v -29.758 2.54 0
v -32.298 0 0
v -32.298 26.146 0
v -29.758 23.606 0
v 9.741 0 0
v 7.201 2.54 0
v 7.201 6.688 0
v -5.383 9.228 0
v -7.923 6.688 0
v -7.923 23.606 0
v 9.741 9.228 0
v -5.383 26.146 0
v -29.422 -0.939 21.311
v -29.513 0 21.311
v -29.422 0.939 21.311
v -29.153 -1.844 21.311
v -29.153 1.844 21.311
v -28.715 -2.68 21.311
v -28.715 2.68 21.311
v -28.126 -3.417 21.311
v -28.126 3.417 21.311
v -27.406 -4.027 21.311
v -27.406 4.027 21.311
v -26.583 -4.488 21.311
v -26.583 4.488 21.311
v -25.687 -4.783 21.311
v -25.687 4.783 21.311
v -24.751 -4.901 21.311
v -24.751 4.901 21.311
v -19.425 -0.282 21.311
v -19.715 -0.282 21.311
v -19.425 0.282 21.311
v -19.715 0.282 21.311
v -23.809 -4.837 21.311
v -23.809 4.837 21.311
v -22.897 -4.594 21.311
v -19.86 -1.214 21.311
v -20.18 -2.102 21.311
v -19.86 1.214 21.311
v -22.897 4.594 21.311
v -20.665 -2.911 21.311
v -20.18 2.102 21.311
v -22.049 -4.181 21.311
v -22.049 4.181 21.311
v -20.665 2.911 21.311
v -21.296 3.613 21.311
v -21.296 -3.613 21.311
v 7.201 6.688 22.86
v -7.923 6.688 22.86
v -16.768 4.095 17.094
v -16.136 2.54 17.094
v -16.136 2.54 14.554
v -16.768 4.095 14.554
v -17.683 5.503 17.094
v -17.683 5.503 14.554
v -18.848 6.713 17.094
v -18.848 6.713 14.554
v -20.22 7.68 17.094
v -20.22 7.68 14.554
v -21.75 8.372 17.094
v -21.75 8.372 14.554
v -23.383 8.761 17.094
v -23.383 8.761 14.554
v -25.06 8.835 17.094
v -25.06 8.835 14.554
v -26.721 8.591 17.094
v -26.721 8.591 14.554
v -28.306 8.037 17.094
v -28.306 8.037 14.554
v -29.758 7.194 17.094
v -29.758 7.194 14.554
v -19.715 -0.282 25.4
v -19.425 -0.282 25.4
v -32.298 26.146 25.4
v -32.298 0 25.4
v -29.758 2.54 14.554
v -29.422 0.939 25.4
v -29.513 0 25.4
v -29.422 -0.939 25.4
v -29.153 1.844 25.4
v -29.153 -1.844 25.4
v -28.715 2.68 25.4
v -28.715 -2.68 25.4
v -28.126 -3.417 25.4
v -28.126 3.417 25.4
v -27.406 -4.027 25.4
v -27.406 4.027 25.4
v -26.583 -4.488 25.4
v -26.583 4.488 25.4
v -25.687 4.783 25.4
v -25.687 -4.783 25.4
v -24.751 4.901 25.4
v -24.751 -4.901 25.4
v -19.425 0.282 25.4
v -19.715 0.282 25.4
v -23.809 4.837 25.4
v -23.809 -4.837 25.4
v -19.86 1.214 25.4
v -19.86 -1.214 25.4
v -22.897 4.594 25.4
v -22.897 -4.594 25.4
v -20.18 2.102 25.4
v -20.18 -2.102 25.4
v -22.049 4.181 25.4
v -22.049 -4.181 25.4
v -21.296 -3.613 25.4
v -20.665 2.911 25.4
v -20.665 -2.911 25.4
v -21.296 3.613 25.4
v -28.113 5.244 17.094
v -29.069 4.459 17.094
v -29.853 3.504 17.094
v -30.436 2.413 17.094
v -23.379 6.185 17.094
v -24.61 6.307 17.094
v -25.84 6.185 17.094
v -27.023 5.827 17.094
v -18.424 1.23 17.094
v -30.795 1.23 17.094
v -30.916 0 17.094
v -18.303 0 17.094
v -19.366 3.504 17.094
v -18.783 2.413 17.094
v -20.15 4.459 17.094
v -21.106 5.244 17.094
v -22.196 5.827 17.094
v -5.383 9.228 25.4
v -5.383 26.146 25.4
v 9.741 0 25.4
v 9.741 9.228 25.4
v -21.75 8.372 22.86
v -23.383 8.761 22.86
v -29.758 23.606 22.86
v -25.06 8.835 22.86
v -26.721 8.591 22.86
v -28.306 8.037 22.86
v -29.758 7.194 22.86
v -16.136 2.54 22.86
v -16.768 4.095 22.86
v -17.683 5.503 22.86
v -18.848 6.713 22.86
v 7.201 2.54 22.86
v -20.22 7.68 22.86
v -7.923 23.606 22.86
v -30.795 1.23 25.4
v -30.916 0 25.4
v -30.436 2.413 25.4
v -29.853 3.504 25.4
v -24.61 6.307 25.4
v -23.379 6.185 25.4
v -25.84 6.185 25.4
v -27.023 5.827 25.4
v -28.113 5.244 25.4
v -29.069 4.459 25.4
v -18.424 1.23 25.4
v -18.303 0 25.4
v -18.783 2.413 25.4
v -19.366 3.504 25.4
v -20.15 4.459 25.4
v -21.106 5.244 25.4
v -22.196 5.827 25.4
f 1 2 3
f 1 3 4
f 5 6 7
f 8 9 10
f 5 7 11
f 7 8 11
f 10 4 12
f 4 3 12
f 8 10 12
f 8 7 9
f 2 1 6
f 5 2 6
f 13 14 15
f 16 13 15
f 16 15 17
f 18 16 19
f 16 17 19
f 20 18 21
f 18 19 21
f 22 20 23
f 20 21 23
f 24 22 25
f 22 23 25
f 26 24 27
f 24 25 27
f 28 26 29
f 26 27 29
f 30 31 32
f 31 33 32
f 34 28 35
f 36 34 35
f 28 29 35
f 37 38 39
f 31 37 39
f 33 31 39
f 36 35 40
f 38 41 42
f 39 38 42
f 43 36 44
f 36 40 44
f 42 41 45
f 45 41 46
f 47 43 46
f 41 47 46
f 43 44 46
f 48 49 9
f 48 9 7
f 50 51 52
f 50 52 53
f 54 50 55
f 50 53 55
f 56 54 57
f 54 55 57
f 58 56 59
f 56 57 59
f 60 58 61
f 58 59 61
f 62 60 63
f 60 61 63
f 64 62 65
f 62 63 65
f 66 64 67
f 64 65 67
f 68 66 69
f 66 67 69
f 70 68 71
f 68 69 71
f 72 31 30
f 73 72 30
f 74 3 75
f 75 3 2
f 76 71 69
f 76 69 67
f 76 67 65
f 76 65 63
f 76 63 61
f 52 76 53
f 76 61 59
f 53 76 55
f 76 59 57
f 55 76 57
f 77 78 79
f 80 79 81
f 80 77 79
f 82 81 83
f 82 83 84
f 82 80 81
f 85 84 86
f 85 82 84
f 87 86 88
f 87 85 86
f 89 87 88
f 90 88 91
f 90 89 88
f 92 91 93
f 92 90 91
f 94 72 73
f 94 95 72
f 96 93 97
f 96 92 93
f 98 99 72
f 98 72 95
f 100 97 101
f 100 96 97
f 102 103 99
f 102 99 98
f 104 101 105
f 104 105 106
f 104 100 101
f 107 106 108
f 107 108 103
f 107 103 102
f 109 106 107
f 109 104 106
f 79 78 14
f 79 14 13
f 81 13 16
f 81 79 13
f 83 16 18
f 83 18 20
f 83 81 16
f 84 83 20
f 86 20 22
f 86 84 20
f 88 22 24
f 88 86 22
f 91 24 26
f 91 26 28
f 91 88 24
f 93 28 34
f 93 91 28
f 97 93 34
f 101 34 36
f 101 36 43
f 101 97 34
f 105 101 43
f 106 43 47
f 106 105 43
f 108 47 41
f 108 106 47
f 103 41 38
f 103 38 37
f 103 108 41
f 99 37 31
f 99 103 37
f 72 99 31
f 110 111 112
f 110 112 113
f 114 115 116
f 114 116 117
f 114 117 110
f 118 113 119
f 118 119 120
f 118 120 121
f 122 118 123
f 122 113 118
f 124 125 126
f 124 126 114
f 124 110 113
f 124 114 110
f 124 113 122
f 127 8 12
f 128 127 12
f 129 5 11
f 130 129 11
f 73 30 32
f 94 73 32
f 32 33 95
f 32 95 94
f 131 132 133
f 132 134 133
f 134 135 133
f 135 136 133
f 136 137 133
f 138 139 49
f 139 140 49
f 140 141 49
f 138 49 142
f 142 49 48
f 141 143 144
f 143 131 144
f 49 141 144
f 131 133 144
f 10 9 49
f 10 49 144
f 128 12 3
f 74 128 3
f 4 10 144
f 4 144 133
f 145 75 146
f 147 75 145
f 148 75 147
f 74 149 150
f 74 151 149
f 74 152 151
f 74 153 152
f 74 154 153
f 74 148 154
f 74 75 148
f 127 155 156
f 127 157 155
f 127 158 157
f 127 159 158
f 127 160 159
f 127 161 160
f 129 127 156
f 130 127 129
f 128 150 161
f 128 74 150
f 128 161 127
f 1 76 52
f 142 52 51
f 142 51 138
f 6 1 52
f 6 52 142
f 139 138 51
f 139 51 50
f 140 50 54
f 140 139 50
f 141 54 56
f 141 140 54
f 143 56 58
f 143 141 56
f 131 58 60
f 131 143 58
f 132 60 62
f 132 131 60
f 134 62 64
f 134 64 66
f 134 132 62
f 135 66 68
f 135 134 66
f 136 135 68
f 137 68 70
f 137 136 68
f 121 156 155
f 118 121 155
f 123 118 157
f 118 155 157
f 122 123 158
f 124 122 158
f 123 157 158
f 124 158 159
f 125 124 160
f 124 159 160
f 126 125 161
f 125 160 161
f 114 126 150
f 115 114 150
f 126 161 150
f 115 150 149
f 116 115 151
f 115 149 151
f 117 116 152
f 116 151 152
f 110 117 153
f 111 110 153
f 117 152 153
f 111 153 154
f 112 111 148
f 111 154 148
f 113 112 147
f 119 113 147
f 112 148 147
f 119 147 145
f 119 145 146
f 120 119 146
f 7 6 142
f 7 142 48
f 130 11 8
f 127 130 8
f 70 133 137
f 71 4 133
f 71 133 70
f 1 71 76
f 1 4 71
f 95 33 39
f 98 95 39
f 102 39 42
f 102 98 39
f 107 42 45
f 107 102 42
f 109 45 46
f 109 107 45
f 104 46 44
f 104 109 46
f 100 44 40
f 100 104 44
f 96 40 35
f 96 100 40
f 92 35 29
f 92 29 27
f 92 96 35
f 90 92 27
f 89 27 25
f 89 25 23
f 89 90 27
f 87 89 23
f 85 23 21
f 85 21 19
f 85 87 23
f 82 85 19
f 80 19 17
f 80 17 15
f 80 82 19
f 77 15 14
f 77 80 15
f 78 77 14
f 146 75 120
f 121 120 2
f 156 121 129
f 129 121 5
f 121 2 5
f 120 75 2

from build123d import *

# Parameters (mm, degrees)
F1_DEPTH    = 25.4
F3_DEPTH    = 8.3058
F4_DEPTH    = 4.0894
F5_W        = 0.9305812418
F5_H        = 0.5637853174
F6_DEPTH    = 4.0894
F7_T        = 2.54
F7_T3_DEPTH = 30.48
F7_T6_ANGLE = 180.000000001


# Not quite as in the source:
# - a shell that OpenCascade refuses in one call is made with other operations: the cavity is built on its own and cut out


with BuildPart() as f1:
    # F0 (on Top) → F1 (new body)
    with BuildSketch(Plane.XY):
        Polygon((-32.2983600199, 26.1462889612), (-32.2983600199, 0), (9.7407754511, 0), (9.7407754511, 9.2281019315), (-5.3830603138, 9.2281019315), (-5.3830603138, 26.1462889612), align=None)
    extrude(amount=F1_DEPTH)

    # F2 (on face) → F3 (cut)
    with BuildSketch(Plane.XY.offset(25.4)):
        with BuildLine():
            Line((-29.5126315491, 0), (-19.7067979438, 0))
            ThreePointArc((-19.7067979438, 0), (-24.6097147465, 4.9029168026), (-29.5126315491, 0))
        make_face()
        with BuildLine():
            Line((-19.7067979438, 0), (-18.3031327531, 0))
            ThreePointArc((-18.3031327531, 0), (-24.6097147465, 6.3065819933), (-30.9162967398, 0))
            Line((-30.9162967398, 0), (-29.5126315491, 0))
            ThreePointArc((-29.5126315491, 0), (-24.6097147465, 4.9029168026), (-19.7067979438, 0))
        make_face()
    extrude(amount=-F3_DEPTH, mode=Mode.SUBTRACT)

    # F7: shell of thickness 2.54, made by hand


with BuildPart() as f4:
    # F2 (on face) → F4 (new body)
    with BuildSketch(Plane.XY.offset(25.4)):
        with BuildLine():
            Line((-29.5126315491, 0), (-19.7067979438, 0))
            ThreePointArc((-19.7067979438, 0), (-24.6097147465, 4.9029168026), (-29.5126315491, 0))
        make_face()
        with BuildLine():
            ThreePointArc((-29.5126315491, 0), (-24.6097147465, -4.9029168026), (-19.7067979438, 0))
            Line((-19.7067979438, 0), (-29.5126315491, 0))
        make_face()
    extrude(amount=-F4_DEPTH)

    # F5 (on face) → F6 (join, through all)
    with BuildSketch(Plane.XY.offset(25.4)):
        with Locations((-19.8902748525, 0)):
            Rectangle(F5_W, F5_H)
    extrude(amount=-F6_DEPTH)


with BuildPart() as f7_core1:
    # F7_t2: copy of F1
    add(f1.part)

    # the walls: a layer under each face that stays
    f7_faces = [f7_core1.faces().sort_by_distance(p)[0] for p in [
        (-32.2983600199, 13.0731444806, 12.7),
        (-18.8407101668, 26.1462889612, 12.7),
        (-11.2787922844, 0, 12.7),
        (-11.2787922844, 13.0731444806, 25.4),
        (-5.3830603138, 17.6871954463, 12.7),
        (9.7407754511, 4.6140509658, 12.7),
        (-24.6097147465, 6.3065819933, 21.2471),
        (-24.6097147465, 3.1532909967, 17.0942),
        (2.1788575687, 9.2281019315, 12.7),
    ]]
    thicken(f7_faces, amount=-F7_T, mode=Mode.SUBTRACT)

    # F7_s4 → F7_t3 (cut)
    with BuildSketch(Plane.XY.offset(-2.54)):
        Polygon((-5.3576603138, 9.2535019315), (-7.9230603138, 9.2281019315), (-7.9230603138, 6.6881019315), (-5.3830603138, 6.6881019315), align=None)
    extrude(amount=F7_T3_DEPTH, mode=Mode.SUBTRACT)

    # F7_s5 → F7_t6 (revolve, cut)
    with BuildSketch(Plane.XZ):
        Polygon((-18.3285327531, 17.1196), (-15.7631327531, 17.0942), (-15.7631327531, 14.5542), (-18.3031327531, 14.5542), align=None)
    revolve(axis=Axis((-24.6097147465, 0, 17.0942), (0, 0, 1)), revolution_arc=F7_T6_ANGLE, mode=Mode.SUBTRACT)


with BuildPart() as f1_1:
    add(f1.part)

    # what is left inside the walls is the cavity
    f7_cavity = [f7_core1.part.solids().sort_by_distance(p)[0] for p in [
        (-11.278792, 2.5654, 15.24),
    ]]
    add(f7_cavity, mode=Mode.SUBTRACT)


solid = Compound([f4.part, f1_1.part])
